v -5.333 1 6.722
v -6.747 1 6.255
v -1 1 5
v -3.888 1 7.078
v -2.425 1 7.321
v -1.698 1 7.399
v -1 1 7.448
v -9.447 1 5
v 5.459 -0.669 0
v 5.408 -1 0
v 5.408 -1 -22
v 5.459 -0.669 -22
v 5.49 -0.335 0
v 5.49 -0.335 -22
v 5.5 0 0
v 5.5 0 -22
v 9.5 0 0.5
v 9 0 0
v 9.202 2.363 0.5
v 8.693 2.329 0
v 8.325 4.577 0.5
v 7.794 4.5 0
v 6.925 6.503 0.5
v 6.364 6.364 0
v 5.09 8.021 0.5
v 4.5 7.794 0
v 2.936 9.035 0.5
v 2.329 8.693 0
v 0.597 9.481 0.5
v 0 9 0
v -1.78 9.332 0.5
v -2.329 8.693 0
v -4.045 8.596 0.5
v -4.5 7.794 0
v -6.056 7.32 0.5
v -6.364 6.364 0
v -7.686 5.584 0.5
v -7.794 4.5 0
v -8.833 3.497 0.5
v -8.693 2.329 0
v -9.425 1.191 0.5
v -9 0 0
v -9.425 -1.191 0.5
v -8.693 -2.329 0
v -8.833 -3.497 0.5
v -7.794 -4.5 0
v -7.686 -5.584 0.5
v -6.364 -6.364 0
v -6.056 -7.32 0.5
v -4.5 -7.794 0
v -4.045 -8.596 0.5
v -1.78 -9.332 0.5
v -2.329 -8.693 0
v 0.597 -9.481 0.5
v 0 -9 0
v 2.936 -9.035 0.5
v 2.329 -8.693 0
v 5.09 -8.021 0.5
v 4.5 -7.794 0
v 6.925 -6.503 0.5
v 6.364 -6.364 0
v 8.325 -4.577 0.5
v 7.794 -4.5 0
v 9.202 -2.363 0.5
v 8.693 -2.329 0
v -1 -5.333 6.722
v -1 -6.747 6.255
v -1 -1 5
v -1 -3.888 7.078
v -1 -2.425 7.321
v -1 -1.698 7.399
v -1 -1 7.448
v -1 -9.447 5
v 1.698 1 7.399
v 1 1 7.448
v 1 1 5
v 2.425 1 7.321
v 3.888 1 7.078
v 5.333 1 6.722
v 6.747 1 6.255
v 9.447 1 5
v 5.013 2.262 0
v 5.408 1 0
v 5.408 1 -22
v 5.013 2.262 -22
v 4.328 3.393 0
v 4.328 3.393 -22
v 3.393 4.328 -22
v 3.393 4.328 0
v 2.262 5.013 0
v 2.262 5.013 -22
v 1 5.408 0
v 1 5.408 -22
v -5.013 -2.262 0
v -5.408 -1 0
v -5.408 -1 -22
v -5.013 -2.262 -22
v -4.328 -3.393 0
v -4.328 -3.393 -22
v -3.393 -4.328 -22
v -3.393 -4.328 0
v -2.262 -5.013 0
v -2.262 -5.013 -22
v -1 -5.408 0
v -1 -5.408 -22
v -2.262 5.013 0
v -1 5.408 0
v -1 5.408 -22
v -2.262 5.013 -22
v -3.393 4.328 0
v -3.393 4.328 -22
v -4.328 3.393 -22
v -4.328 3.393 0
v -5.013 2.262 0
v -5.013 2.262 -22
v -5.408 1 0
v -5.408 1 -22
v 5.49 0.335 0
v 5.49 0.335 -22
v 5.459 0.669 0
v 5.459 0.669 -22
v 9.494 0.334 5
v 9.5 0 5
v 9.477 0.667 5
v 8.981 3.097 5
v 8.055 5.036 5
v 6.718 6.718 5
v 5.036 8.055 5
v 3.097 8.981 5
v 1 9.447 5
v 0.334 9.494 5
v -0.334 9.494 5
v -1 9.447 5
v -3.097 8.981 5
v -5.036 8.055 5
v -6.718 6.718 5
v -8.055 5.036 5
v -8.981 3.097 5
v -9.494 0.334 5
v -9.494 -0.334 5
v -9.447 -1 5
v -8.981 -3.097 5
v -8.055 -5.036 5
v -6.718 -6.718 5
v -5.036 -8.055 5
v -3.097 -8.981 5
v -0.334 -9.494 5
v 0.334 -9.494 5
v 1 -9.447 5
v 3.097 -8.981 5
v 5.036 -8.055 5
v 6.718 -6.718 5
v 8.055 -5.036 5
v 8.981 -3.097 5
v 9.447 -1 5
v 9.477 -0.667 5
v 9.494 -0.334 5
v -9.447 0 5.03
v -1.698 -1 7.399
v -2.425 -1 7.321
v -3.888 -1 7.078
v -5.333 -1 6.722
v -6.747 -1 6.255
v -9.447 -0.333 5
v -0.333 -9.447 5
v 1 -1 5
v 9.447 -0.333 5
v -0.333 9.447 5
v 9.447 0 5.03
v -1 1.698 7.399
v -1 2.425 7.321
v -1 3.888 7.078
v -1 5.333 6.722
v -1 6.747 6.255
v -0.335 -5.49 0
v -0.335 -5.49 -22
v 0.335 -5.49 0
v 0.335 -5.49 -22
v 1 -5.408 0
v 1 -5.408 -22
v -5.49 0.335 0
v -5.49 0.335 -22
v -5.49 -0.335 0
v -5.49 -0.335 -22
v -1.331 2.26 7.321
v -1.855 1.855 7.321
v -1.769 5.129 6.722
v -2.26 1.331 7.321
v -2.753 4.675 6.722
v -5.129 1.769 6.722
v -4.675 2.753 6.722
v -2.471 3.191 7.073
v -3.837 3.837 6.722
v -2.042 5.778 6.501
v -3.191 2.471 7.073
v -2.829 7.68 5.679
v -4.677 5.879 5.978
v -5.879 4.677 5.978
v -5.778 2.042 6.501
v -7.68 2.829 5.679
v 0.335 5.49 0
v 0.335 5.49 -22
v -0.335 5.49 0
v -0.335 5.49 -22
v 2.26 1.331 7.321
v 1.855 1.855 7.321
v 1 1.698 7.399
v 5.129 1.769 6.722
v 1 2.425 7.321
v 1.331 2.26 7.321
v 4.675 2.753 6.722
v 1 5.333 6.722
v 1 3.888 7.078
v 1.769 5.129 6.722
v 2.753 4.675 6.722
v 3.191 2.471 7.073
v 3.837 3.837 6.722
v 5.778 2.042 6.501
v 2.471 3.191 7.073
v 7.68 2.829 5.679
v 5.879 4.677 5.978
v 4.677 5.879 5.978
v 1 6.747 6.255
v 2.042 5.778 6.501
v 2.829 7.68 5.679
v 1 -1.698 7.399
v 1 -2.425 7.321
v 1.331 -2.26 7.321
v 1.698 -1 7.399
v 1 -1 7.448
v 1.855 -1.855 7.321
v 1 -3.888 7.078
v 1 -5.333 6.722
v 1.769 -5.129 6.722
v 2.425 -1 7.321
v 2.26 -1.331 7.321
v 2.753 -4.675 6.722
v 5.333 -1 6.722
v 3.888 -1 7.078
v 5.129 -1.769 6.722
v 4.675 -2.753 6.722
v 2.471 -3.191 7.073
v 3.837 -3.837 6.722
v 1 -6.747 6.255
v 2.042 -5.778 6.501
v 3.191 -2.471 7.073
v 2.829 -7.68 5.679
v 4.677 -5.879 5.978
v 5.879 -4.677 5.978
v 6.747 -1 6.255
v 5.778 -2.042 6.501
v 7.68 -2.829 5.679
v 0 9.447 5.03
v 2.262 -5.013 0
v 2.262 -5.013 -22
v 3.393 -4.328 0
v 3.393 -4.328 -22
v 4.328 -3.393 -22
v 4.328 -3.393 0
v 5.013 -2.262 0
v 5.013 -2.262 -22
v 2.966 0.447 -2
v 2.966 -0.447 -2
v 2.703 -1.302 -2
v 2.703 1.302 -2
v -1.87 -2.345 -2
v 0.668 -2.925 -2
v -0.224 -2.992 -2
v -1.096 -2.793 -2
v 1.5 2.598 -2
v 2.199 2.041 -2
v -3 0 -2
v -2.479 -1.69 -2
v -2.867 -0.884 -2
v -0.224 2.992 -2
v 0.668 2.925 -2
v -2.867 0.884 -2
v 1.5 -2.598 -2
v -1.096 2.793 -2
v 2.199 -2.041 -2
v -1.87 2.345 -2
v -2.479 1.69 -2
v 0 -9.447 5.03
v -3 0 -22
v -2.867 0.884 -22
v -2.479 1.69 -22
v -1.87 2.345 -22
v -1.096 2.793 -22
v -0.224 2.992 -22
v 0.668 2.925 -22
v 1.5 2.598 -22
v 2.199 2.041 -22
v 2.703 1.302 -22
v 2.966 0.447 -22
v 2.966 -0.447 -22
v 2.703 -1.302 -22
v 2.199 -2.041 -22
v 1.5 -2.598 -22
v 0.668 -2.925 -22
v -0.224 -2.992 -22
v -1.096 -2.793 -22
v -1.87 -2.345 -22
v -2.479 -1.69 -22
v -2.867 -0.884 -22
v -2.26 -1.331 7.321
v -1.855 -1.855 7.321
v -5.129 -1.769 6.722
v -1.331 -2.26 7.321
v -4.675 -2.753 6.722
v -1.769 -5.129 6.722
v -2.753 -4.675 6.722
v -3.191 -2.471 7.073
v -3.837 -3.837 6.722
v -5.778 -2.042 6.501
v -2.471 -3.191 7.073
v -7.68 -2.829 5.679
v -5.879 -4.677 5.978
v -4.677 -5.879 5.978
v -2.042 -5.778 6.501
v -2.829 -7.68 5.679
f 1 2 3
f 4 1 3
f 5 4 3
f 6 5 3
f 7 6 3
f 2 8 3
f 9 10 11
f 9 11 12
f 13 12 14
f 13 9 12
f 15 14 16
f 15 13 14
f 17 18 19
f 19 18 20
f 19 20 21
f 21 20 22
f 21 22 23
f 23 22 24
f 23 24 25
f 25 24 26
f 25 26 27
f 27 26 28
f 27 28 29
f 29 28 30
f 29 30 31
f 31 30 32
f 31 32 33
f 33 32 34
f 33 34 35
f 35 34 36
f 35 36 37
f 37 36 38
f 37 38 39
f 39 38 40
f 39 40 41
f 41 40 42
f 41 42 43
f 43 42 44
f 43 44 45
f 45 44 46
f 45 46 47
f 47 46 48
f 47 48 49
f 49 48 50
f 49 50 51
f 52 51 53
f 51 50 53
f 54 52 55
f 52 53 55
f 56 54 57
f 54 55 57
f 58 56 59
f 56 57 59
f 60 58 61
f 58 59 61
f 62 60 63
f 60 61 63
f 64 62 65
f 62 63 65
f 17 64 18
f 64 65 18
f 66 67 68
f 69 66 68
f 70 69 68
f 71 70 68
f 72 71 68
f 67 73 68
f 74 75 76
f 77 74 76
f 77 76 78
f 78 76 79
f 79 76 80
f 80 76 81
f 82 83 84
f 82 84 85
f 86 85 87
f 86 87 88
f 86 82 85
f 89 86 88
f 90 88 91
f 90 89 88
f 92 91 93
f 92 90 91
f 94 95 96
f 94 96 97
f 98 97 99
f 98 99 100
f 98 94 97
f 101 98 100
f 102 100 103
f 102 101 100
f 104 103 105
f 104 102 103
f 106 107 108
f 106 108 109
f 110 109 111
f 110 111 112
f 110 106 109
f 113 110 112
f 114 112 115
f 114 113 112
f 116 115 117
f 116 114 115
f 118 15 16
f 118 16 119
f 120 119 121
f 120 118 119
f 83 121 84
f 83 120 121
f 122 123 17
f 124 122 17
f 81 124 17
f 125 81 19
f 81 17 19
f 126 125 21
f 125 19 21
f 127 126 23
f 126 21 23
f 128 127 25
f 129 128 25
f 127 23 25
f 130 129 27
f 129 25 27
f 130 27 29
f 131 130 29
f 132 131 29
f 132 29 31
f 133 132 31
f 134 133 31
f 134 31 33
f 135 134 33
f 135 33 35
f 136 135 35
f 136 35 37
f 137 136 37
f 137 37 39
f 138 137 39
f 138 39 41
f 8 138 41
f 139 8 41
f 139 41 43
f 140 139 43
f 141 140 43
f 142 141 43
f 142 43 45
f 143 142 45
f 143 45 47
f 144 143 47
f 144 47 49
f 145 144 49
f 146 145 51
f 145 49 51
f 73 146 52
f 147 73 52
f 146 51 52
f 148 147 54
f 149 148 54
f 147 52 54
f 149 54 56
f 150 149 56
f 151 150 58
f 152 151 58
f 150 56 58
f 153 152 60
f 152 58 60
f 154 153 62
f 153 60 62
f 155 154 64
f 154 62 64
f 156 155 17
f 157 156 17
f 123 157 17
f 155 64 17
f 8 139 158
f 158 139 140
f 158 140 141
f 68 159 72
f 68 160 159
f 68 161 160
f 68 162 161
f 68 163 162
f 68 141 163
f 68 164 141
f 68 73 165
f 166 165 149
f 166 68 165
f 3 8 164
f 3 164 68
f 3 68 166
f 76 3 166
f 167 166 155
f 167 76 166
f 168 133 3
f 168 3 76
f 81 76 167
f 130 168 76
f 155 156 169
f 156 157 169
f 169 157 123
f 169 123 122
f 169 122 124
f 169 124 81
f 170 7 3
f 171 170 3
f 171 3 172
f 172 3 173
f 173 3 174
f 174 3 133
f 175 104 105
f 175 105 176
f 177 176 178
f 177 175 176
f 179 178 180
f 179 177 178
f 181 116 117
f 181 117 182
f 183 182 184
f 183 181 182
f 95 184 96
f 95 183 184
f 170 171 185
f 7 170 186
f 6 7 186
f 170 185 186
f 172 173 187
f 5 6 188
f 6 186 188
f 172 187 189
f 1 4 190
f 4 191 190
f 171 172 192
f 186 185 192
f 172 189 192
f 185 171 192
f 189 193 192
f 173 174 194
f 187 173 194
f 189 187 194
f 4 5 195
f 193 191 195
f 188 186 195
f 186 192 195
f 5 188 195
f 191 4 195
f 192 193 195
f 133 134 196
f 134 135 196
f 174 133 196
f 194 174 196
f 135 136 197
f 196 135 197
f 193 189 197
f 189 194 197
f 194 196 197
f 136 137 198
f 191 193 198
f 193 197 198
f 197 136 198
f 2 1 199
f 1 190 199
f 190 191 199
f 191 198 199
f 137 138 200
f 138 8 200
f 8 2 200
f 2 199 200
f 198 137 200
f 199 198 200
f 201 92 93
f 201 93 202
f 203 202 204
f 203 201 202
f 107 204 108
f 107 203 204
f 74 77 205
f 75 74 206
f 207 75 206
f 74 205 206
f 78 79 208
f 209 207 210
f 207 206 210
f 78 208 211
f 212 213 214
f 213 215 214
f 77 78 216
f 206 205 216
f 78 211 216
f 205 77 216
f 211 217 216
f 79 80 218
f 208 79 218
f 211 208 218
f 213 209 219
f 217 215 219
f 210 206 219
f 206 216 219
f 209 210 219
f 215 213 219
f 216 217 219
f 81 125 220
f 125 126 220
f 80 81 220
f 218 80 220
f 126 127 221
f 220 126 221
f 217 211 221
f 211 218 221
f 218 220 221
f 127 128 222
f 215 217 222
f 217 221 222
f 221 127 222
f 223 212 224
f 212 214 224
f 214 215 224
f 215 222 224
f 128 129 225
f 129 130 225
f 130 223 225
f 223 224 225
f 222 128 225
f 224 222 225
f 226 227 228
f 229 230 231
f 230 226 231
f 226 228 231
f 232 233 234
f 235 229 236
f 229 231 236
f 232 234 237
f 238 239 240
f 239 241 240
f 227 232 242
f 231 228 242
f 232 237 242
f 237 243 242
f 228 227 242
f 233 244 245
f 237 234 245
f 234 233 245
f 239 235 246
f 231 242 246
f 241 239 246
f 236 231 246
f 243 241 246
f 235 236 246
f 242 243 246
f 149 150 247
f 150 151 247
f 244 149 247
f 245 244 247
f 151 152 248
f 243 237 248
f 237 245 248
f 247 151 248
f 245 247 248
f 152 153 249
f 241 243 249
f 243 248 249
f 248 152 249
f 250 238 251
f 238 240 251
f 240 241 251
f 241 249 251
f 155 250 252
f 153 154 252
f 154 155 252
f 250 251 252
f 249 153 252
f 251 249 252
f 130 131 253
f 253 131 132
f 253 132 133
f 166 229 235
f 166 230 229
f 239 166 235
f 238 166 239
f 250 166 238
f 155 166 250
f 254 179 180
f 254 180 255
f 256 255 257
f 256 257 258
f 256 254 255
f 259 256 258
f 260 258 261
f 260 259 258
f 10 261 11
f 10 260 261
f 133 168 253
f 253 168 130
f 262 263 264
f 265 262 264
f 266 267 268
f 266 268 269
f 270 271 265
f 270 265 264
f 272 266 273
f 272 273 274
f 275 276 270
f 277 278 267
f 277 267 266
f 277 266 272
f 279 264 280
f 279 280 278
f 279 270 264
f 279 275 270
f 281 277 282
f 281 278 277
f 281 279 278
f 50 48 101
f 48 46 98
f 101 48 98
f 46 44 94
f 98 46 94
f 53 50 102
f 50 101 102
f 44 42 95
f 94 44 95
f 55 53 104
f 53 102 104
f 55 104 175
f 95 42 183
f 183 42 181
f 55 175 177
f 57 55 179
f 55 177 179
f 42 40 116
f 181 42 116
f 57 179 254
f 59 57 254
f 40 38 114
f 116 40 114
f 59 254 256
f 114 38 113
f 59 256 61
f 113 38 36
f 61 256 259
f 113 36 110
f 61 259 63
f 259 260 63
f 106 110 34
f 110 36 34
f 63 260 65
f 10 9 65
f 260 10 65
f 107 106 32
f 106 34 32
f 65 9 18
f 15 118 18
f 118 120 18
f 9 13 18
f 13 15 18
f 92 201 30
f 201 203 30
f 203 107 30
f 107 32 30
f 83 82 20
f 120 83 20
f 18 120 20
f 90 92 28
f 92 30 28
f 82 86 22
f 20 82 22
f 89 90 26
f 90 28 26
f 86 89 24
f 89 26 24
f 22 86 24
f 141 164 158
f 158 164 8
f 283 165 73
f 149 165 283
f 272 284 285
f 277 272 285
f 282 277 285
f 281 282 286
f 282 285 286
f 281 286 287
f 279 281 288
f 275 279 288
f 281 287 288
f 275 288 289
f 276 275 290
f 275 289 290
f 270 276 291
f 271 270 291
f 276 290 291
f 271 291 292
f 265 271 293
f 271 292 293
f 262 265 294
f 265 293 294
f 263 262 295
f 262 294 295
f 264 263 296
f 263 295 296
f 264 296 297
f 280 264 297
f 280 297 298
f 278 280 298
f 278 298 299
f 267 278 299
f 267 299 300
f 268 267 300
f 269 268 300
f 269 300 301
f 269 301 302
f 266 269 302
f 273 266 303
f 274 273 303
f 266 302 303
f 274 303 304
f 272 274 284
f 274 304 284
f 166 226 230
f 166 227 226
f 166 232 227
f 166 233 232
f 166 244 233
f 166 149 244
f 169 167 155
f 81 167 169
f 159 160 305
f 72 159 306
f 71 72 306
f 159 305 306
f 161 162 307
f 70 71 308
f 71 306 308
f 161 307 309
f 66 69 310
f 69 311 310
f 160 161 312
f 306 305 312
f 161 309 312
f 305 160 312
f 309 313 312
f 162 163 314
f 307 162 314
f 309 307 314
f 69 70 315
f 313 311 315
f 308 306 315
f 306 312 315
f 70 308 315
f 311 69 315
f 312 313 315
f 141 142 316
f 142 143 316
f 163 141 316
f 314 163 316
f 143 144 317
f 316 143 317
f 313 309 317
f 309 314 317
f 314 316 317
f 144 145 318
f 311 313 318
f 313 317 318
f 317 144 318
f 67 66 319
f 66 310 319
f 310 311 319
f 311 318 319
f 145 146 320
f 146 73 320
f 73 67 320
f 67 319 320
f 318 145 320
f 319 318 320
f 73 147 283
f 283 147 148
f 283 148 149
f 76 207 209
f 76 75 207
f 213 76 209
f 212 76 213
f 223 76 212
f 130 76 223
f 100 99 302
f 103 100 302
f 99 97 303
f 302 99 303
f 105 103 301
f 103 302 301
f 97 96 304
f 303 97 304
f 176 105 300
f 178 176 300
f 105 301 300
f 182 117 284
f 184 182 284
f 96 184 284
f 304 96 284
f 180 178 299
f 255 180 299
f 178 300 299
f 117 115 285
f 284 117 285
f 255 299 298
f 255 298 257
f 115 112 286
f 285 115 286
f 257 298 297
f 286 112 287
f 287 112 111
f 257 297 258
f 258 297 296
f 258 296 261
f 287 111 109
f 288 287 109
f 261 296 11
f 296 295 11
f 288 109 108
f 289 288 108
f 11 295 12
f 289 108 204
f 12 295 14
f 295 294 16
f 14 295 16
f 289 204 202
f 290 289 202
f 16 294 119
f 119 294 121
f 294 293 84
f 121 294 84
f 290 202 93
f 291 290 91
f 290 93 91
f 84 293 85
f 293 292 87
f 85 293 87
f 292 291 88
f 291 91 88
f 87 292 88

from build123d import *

# Parameters (mm, degrees)
SKETCH1_R           = 9.5
SKETCH1_W           = 2
SKETCH1_H           = 18.894443628
BOSS_EXTRUDE1_DEPTH = 5
SKETCH1_3_R         = 5.5
BOSS_EXTRUDE2_DEPTH = 22
CUT_EXTRUDE2_REACH  = 32.778
CUT_EXTRUDE2_START  = 5
SKETCH1_4_W         = 2
SKETCH1_4_H         = 18.894443628
SKETCH1_4_W_2       = 18.894443628
SKETCH1_4_H_2       = 2
CHAMFER1_SIZE       = 0.5
SKETCH7_R           = 3
CUT_EXTRUDE3_DEPTH  = 20


with BuildPart() as part:
    # Sketch1 → Boss-Extrude1 (new body)
    with BuildSketch(Plane.XY):
        Circle(SKETCH1_R)
        Rectangle(SKETCH1_W, SKETCH1_H)
    extrude(amount=BOSS_EXTRUDE1_DEPTH)

    # Sketch1<3> → Boss-Extrude2 (add)
    with BuildSketch(Plane.XY):
        Circle(SKETCH1_3_R)
    extrude(amount=-BOSS_EXTRUDE2_DEPTH)

    # Sketch2 → Revolve1 (revolve)
    with BuildSketch(Plane(origin=(0, 0, 0), x_dir=(0, 0, -1), z_dir=(1, 0, 0))):
        with BuildLine():
            Line((-5, 9.5), (-5, 0))
            Line((-5, 0), (-7.5, 0))
            ThreePointArc((-7.5, 0), (-6.864538569, 4.911720676), (-5, 9.5))
        make_face()
    revolve(axis=Axis((0, 0, 0), (0, 0, 1)))

    # Sketch1<4> → Cut-Extrude2 (cut, up to next)
    with BuildSketch(Plane.XY.offset(CUT_EXTRUDE2_START), mode=Mode.PRIVATE) as cut_extrude2_sk1:
        Rectangle(SKETCH1_4_W, SKETCH1_4_H)
    cut_extrude2_tool1 = extrude(cut_extrude2_sk1.sketch, amount=CUT_EXTRUDE2_REACH, mode=Mode.PRIVATE) & part.part
    # Sketch1<4> → Cut-Extrude2 (cut, up to next)
    with BuildSketch(Plane.XY.offset(CUT_EXTRUDE2_START), mode=Mode.PRIVATE) as cut_extrude2_sk2:
        Rectangle(SKETCH1_4_W_2, SKETCH1_4_H_2)
    cut_extrude2_tool2 = extrude(cut_extrude2_sk2.sketch, amount=CUT_EXTRUDE2_REACH, mode=Mode.PRIVATE) & part.part
    add(cut_extrude2_tool1.solids().sort_by_distance((0, 0, 5))[0], mode=Mode.SUBTRACT)
    add(cut_extrude2_tool2.solids().sort_by_distance((0, 0, 5))[0], mode=Mode.SUBTRACT)

    # Chamfer1
    chamfer1_edges = [part.edges().sort_by_distance(p)[0] for p in [
        (-9.5, 0, 0),
    ]]
    chamfer(chamfer1_edges, length=CHAMFER1_SIZE)

    # Sketch7 → Cut-Extrude3 (cut)
    with BuildSketch(Plane(origin=(0, 0, -22), x_dir=(-1, 0, 0), z_dir=(0, 0, -1))):
        Circle(SKETCH7_R)
    extrude(amount=-CUT_EXTRUDE3_DEPTH, mode=Mode.SUBTRACT)


solid = part.part
